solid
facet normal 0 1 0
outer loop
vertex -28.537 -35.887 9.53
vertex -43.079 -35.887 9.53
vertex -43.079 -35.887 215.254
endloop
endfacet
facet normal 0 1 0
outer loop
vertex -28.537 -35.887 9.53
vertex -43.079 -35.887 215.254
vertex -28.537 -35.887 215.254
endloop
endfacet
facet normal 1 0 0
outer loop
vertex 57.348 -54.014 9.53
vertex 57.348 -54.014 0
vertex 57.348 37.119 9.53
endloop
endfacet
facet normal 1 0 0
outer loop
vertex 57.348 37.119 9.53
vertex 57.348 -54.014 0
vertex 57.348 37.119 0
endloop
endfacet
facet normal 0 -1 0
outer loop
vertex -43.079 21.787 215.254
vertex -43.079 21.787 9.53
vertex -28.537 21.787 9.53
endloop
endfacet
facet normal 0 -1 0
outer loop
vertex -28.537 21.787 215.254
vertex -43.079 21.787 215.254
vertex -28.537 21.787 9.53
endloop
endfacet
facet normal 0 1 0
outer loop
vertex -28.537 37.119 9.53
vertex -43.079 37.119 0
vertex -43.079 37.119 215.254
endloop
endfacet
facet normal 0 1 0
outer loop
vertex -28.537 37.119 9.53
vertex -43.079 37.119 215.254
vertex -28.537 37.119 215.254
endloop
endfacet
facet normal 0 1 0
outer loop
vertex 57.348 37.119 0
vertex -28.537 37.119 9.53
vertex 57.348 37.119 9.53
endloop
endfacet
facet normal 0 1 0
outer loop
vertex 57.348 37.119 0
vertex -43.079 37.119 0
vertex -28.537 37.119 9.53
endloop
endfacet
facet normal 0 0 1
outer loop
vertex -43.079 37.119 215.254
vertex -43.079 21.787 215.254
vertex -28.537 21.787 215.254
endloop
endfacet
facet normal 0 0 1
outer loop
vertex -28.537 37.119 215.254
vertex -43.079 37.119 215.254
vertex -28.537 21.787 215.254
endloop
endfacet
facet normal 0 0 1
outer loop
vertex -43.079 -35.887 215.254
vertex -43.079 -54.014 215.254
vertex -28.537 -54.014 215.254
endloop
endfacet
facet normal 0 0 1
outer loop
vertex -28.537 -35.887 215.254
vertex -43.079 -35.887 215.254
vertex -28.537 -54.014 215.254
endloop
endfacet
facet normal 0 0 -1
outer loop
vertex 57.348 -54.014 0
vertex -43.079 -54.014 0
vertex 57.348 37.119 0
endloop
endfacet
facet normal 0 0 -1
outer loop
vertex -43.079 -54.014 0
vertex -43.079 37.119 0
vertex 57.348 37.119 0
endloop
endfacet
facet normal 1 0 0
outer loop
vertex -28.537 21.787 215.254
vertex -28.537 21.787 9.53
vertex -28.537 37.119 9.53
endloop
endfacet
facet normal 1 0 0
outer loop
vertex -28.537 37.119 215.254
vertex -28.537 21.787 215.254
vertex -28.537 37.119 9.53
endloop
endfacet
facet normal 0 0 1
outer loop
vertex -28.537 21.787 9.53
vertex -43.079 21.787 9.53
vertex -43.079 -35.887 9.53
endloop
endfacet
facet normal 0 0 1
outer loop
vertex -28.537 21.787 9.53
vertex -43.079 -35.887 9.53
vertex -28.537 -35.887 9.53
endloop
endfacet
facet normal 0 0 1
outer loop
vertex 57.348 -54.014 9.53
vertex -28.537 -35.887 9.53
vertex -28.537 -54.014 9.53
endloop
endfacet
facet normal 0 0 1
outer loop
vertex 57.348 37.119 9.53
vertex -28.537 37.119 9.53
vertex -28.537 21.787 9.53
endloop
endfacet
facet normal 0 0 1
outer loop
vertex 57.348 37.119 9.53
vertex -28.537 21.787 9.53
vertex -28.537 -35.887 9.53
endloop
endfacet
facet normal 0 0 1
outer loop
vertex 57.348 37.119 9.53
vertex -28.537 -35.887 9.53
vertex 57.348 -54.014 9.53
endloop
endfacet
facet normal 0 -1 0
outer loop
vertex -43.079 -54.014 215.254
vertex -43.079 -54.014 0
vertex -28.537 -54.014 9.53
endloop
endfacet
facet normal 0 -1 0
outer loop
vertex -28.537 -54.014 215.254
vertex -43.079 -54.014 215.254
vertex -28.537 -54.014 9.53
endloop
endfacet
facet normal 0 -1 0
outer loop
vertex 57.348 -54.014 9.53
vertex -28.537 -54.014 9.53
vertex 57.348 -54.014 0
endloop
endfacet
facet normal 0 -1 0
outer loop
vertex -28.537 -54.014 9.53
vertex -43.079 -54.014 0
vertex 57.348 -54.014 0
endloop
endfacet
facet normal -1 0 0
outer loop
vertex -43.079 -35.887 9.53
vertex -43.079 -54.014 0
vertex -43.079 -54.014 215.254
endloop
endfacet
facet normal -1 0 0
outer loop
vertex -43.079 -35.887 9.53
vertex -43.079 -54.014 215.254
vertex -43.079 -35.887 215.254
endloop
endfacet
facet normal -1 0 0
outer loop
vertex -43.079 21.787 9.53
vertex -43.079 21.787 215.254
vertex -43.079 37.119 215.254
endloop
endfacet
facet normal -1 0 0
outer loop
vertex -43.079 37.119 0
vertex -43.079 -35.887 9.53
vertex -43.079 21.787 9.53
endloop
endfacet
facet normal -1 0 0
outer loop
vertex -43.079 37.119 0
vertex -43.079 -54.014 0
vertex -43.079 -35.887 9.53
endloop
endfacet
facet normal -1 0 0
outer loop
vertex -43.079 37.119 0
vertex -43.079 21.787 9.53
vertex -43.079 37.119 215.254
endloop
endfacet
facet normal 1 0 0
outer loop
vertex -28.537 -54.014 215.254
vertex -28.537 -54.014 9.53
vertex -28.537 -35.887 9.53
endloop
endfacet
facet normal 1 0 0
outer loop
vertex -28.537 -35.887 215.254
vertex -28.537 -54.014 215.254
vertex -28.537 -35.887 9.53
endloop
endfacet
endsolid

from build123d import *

# Parameters (mm, degrees)
F0_W     = 16.4634734392
F0_H     = 13.1345540285
F0_H_2   = 62.0689839125
F0_W_2   = 13.7195661664
F0_W_3   = 70.2442079782
F0_H_3   = 15.9291923046
F1_DEPTH = 9.5300190151
F2_W     = 14.5427659154
F2_H     = 15.3316706419
F2_H_2   = 18.1263536215
F3_DEPTH = 205.7239394635


# Not quite as in the source:
# - the program builds the solid bodies; features that only make, move or delete a surface that nothing else refers to are left out


with BuildPart() as f1:
    # F0 (on Top) → F1 (new body)
    with BuildSketch(Plane.XY):
        with Locations((49.1160675883, 30.5517539382)):
            Rectangle(F0_W, F0_H)
        with Locations((49.1160675883, -7.0500150323)):
            Rectangle(F0_W, F0_H_2)
        with Locations((-36.2196601927, 30.5517539382)):
            Rectangle(F0_W_2, F0_H)
        with Locations((5.7622268796, 30.5517539382)):
            Rectangle(F0_W_3, F0_H)
        with Locations((-36.2196601927, -7.0500150323)):
            Rectangle(F0_W_2, F0_H_2)
        with Locations((-36.2196601927, -46.0491031408)):
            Rectangle(F0_W_2, F0_H_3)
        with Locations((5.7622268796, -46.0491031408)):
            Rectangle(F0_W_3, F0_H_3)
        with Locations((49.1160675883, -46.0491031408)):
            Rectangle(F0_W, F0_H_3)
        with Locations((5.7622268796, -7.0500150323)):
            Rectangle(F0_W_3, F0_H_2)
    extrude(amount=F1_DEPTH)

    # F2 (on face) → F3 (join)
    with BuildSketch(Plane.XY.offset(9.5300190151)):
        with Locations((-35.8080603182, 29.4531956315)):
            Rectangle(F2_W, F2_H)
        with Locations((-35.8080603182, -44.9505224824)):
            Rectangle(F2_W, F2_H_2)
    extrude(amount=F3_DEPTH)


solid = f1.part
